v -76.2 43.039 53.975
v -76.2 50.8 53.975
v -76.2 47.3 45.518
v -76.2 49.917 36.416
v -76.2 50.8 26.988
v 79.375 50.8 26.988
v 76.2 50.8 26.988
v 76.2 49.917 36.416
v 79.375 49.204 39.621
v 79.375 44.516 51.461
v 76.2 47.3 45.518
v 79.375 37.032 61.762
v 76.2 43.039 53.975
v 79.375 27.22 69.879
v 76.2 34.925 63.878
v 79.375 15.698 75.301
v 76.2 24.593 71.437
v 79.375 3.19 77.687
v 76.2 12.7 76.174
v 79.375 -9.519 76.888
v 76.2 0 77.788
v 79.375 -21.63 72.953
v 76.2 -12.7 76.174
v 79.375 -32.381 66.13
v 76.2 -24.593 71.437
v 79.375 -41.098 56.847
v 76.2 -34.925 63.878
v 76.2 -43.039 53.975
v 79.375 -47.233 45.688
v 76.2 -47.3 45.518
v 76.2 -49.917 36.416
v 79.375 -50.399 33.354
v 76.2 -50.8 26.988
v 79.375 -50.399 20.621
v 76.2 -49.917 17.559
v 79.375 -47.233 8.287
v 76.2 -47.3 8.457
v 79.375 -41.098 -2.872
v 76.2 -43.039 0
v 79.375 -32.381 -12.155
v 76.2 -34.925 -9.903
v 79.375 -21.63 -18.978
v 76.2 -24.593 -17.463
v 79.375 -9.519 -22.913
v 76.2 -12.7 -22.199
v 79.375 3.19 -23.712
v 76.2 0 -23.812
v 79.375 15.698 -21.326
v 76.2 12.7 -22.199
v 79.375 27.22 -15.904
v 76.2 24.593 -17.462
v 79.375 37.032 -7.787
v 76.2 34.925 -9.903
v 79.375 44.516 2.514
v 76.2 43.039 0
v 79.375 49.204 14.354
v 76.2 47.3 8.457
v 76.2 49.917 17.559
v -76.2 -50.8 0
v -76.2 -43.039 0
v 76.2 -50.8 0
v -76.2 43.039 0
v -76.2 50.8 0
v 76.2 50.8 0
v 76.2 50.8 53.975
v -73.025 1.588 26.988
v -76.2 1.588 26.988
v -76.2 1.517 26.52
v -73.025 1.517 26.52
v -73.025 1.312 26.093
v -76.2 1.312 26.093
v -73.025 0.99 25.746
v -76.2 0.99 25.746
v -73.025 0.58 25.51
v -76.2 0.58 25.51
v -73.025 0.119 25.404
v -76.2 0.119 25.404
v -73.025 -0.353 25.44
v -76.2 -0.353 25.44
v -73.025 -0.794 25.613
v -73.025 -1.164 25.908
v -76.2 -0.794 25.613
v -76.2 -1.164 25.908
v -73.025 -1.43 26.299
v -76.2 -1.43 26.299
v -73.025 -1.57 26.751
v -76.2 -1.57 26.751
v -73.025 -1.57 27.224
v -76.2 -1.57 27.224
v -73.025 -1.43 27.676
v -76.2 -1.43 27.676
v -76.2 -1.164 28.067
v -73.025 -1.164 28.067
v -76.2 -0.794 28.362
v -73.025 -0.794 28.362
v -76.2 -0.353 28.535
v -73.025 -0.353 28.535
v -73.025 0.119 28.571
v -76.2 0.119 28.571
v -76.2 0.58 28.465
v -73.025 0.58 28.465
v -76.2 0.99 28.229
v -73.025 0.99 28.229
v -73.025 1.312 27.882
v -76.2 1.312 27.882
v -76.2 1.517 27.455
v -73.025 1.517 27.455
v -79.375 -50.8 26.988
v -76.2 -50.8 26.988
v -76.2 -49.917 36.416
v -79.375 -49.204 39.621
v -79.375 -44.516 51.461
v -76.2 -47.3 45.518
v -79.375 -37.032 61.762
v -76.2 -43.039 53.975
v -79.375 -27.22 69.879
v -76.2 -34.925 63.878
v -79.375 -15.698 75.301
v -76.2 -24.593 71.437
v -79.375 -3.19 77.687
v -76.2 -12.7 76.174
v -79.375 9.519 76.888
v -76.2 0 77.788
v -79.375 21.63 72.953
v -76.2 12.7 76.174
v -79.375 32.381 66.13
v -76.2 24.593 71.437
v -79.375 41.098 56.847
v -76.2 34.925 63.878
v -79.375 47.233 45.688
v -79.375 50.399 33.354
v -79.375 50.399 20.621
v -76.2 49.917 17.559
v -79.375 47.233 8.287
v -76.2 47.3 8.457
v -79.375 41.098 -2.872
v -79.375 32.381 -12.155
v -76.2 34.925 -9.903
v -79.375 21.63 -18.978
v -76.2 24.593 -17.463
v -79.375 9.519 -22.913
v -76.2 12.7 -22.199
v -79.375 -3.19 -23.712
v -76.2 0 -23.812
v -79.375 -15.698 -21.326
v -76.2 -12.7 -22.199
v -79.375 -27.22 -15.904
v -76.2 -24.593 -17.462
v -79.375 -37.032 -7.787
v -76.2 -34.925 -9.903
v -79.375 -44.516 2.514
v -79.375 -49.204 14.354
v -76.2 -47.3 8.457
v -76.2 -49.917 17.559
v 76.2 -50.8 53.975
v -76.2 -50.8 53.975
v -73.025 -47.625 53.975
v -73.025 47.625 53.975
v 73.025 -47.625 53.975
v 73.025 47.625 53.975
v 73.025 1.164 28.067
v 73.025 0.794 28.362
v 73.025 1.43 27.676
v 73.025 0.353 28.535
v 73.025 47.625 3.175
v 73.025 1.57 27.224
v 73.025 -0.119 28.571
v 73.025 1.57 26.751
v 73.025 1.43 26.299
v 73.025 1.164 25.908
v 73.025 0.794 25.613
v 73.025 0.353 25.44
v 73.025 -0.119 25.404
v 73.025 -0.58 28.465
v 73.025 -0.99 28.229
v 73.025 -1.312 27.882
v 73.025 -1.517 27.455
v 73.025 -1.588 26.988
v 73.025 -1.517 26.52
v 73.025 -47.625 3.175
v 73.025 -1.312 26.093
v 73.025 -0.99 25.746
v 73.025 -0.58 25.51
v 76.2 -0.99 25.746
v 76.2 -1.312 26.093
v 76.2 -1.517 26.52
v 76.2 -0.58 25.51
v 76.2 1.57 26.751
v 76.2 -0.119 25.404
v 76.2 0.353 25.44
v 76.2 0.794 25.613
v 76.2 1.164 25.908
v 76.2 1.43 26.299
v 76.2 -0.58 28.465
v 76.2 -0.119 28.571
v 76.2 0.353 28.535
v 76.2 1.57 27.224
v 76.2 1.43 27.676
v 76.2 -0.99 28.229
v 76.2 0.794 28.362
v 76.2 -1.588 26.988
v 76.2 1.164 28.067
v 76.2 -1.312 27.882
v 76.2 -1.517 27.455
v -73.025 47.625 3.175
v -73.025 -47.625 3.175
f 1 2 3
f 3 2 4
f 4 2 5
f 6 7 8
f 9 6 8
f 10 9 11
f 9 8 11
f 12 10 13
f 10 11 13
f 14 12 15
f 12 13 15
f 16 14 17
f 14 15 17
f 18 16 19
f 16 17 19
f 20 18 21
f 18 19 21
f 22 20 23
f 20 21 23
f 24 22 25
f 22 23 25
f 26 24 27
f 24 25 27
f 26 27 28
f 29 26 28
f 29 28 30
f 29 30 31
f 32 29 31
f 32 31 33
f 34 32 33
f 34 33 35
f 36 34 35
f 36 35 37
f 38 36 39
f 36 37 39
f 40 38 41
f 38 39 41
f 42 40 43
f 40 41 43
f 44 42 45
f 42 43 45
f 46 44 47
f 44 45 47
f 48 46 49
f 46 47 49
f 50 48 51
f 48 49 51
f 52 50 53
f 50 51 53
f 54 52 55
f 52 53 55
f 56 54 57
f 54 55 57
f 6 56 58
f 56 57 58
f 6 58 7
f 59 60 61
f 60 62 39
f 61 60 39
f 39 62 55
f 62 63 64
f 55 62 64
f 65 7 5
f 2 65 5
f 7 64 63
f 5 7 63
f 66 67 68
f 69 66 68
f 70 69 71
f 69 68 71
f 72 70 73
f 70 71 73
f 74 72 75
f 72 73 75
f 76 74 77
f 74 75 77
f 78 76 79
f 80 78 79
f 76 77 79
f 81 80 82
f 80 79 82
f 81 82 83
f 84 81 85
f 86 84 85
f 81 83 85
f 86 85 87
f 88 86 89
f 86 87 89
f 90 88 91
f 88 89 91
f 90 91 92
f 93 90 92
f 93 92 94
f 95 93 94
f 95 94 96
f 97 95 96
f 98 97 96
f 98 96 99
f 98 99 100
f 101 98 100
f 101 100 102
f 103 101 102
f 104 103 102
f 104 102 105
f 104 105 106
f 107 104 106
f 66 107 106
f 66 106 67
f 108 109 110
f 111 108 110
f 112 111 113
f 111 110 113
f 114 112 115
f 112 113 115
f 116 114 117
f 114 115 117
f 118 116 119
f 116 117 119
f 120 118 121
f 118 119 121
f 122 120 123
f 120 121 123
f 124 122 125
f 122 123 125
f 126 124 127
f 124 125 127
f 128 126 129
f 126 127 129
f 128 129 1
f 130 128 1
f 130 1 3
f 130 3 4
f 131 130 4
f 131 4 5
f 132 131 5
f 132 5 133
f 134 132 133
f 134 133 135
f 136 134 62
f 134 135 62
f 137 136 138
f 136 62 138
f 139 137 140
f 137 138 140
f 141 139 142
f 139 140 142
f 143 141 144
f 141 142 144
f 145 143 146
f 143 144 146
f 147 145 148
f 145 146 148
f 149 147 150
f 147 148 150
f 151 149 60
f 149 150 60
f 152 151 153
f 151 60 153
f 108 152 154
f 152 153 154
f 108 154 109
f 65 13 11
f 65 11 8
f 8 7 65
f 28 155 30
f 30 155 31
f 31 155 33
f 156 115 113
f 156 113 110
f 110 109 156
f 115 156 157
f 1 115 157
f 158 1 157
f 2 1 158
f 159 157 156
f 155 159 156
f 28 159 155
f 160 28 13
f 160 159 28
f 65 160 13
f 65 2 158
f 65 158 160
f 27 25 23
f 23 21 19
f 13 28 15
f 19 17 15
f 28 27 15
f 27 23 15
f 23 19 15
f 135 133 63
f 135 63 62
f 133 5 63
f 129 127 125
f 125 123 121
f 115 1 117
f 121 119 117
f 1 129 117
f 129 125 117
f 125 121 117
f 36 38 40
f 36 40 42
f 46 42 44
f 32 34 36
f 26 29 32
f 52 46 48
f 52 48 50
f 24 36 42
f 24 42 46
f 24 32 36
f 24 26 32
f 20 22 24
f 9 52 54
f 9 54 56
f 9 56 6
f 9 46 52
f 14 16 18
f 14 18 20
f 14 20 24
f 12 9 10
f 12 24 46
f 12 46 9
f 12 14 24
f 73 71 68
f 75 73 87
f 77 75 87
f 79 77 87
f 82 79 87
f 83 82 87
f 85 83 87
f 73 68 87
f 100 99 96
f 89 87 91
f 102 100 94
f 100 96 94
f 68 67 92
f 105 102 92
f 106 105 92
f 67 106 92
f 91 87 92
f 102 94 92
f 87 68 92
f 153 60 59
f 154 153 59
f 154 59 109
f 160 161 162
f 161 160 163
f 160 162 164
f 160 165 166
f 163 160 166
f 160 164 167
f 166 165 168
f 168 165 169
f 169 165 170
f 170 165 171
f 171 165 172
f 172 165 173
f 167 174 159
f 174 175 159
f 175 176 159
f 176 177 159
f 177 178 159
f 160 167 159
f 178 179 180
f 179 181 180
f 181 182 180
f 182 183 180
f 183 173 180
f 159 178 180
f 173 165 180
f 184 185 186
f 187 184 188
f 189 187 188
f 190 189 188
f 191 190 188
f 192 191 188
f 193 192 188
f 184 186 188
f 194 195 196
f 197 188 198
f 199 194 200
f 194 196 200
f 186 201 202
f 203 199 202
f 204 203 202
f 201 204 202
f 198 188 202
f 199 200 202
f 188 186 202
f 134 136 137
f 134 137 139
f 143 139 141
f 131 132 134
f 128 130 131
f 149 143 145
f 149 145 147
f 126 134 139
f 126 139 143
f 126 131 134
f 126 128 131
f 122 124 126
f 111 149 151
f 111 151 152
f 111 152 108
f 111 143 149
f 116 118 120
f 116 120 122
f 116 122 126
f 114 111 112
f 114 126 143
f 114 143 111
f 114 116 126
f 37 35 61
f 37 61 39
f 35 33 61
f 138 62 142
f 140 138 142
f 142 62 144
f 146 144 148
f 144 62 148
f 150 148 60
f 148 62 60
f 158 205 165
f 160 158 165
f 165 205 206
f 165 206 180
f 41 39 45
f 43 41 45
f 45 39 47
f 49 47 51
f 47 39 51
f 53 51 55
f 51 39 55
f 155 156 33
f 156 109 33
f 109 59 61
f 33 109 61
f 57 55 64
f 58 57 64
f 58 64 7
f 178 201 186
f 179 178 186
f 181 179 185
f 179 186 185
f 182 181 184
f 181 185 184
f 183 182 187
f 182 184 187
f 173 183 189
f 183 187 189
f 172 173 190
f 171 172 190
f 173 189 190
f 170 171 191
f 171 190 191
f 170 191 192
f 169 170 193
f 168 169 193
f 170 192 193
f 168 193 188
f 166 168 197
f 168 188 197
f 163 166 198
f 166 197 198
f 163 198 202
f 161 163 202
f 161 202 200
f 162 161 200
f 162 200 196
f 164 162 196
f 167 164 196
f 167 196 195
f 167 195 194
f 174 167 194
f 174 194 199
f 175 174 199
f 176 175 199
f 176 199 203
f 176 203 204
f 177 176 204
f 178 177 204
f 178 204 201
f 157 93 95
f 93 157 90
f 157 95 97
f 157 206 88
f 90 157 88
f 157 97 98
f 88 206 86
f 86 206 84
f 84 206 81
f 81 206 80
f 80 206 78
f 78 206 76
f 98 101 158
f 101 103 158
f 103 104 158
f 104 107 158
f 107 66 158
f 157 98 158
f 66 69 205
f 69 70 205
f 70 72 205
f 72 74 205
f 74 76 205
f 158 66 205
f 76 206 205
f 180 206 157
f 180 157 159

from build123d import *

# Parameters (mm, degrees)
F0_W      = 152.4
F0_H      = 101.6
F1_DEPTH  = 3.175
F2_W      = 146.05
F2_H      = 3.175
F3_DEPTH  = 50.8
F5_DEPTH  = 25.4
F7_DEPTH  = 3.175
F8_DEPTH  = 25.4
F9_R      = 50.8
F10_DEPTH = 3.175
F11_R     = 50.8
F12_DEPTH = 3.175


# Not quite as in the source:
# - a length typed as a fraction of an inch, garbled in the dataset ("3 / 203.2 mm" for 3/8 in), is restored


with BuildPart() as f1:
    # F0 (on Top) → F1 (new body)
    with BuildSketch(Plane.XY):
        Rectangle(F0_W, F0_H)
    extrude(amount=F1_DEPTH)

    # F2 (on face) → F3 (join)
    with BuildSketch(Plane.XY.offset(3.175)):
        Polygon((-73.025, 50.8), (-76.2, 50.8), (-76.2, -50.8), (-73.025, -50.8), (-73.025, -47.625), (-73.025, 47.625), align=None)
        with Locations((0, 49.2125)):
            Rectangle(F2_W, F2_H)
        Polygon((76.2, 50.8), (73.025, 50.8), (73.025, 47.625), (73.025, -47.625), (73.025, -50.8), (76.2, -50.8), align=None)
        with Locations((0, -49.2125)):
            Rectangle(F2_W, F2_H)
    extrude(amount=F3_DEPTH)

    # F4 (on face) → F5 (cut)
    with BuildSketch(Plane.YZ.offset(76.2)):
        with BuildLine():
            ThreePointArc((1.5875, 26.9875), (0, 28.575), (-1.5875, 26.9875))
            Line((-1.5875, 26.9875), (1.5875, 26.9875))
        make_face()
        with BuildLine():
            Line((1.5875, 26.9875), (-1.5875, 26.9875))
            ThreePointArc((-1.5875, 26.9875), (0, 25.4), (1.5875, 26.9875))
        make_face()
    extrude(amount=-F5_DEPTH, mode=Mode.SUBTRACT)

    # F6 (on face) → F7 (cut)
    with BuildSketch(Plane(origin=(-76.2, 0, 0), x_dir=(0, -1, 0), z_dir=(-1, 0, 0))):
        with BuildLine():
            Line((-1.5875, 26.9875), (1.5875, 26.9875))
            ThreePointArc((1.5875, 26.9875), (0, 28.575), (-1.5875, 26.9875))
        make_face()
        with BuildLine():
            ThreePointArc((-1.5875, 26.9875), (0, 25.4), (1.5875, 26.9875))
            Line((1.5875, 26.9875), (-1.5875, 26.9875))
        make_face()
    extrude(amount=F7_DEPTH, mode=Mode.SUBTRACT)

    # F6 (on face) → F8 (cut)
    with BuildSketch(Plane(origin=(-76.2, 0, 0), x_dir=(0, -1, 0), z_dir=(-1, 0, 0))):
        with BuildLine():
            Line((-1.5875, 26.9875), (1.5875, 26.9875))
            ThreePointArc((1.5875, 26.9875), (0, 28.575), (-1.5875, 26.9875))
        make_face()
        with BuildLine():
            ThreePointArc((-1.5875, 26.9875), (0, 25.4), (1.5875, 26.9875))
            Line((1.5875, 26.9875), (-1.5875, 26.9875))
        make_face()
    extrude(amount=-F8_DEPTH, mode=Mode.SUBTRACT)

    # F9 (on face) → F10 (join)
    with BuildSketch(Plane.YZ.offset(76.2)):
        with Locations((0, 26.9875)):
            Circle(F9_R)
    extrude(amount=F10_DEPTH)

    # F11 (on face) → F12 (join)
    with BuildSketch(Plane(origin=(-76.2, 0, 0), x_dir=(0, -1, 0), z_dir=(-1, 0, 0))):
        with Locations((0, 26.9875)):
            Circle(F11_R)
    extrude(amount=F12_DEPTH)


solid = f1.part
